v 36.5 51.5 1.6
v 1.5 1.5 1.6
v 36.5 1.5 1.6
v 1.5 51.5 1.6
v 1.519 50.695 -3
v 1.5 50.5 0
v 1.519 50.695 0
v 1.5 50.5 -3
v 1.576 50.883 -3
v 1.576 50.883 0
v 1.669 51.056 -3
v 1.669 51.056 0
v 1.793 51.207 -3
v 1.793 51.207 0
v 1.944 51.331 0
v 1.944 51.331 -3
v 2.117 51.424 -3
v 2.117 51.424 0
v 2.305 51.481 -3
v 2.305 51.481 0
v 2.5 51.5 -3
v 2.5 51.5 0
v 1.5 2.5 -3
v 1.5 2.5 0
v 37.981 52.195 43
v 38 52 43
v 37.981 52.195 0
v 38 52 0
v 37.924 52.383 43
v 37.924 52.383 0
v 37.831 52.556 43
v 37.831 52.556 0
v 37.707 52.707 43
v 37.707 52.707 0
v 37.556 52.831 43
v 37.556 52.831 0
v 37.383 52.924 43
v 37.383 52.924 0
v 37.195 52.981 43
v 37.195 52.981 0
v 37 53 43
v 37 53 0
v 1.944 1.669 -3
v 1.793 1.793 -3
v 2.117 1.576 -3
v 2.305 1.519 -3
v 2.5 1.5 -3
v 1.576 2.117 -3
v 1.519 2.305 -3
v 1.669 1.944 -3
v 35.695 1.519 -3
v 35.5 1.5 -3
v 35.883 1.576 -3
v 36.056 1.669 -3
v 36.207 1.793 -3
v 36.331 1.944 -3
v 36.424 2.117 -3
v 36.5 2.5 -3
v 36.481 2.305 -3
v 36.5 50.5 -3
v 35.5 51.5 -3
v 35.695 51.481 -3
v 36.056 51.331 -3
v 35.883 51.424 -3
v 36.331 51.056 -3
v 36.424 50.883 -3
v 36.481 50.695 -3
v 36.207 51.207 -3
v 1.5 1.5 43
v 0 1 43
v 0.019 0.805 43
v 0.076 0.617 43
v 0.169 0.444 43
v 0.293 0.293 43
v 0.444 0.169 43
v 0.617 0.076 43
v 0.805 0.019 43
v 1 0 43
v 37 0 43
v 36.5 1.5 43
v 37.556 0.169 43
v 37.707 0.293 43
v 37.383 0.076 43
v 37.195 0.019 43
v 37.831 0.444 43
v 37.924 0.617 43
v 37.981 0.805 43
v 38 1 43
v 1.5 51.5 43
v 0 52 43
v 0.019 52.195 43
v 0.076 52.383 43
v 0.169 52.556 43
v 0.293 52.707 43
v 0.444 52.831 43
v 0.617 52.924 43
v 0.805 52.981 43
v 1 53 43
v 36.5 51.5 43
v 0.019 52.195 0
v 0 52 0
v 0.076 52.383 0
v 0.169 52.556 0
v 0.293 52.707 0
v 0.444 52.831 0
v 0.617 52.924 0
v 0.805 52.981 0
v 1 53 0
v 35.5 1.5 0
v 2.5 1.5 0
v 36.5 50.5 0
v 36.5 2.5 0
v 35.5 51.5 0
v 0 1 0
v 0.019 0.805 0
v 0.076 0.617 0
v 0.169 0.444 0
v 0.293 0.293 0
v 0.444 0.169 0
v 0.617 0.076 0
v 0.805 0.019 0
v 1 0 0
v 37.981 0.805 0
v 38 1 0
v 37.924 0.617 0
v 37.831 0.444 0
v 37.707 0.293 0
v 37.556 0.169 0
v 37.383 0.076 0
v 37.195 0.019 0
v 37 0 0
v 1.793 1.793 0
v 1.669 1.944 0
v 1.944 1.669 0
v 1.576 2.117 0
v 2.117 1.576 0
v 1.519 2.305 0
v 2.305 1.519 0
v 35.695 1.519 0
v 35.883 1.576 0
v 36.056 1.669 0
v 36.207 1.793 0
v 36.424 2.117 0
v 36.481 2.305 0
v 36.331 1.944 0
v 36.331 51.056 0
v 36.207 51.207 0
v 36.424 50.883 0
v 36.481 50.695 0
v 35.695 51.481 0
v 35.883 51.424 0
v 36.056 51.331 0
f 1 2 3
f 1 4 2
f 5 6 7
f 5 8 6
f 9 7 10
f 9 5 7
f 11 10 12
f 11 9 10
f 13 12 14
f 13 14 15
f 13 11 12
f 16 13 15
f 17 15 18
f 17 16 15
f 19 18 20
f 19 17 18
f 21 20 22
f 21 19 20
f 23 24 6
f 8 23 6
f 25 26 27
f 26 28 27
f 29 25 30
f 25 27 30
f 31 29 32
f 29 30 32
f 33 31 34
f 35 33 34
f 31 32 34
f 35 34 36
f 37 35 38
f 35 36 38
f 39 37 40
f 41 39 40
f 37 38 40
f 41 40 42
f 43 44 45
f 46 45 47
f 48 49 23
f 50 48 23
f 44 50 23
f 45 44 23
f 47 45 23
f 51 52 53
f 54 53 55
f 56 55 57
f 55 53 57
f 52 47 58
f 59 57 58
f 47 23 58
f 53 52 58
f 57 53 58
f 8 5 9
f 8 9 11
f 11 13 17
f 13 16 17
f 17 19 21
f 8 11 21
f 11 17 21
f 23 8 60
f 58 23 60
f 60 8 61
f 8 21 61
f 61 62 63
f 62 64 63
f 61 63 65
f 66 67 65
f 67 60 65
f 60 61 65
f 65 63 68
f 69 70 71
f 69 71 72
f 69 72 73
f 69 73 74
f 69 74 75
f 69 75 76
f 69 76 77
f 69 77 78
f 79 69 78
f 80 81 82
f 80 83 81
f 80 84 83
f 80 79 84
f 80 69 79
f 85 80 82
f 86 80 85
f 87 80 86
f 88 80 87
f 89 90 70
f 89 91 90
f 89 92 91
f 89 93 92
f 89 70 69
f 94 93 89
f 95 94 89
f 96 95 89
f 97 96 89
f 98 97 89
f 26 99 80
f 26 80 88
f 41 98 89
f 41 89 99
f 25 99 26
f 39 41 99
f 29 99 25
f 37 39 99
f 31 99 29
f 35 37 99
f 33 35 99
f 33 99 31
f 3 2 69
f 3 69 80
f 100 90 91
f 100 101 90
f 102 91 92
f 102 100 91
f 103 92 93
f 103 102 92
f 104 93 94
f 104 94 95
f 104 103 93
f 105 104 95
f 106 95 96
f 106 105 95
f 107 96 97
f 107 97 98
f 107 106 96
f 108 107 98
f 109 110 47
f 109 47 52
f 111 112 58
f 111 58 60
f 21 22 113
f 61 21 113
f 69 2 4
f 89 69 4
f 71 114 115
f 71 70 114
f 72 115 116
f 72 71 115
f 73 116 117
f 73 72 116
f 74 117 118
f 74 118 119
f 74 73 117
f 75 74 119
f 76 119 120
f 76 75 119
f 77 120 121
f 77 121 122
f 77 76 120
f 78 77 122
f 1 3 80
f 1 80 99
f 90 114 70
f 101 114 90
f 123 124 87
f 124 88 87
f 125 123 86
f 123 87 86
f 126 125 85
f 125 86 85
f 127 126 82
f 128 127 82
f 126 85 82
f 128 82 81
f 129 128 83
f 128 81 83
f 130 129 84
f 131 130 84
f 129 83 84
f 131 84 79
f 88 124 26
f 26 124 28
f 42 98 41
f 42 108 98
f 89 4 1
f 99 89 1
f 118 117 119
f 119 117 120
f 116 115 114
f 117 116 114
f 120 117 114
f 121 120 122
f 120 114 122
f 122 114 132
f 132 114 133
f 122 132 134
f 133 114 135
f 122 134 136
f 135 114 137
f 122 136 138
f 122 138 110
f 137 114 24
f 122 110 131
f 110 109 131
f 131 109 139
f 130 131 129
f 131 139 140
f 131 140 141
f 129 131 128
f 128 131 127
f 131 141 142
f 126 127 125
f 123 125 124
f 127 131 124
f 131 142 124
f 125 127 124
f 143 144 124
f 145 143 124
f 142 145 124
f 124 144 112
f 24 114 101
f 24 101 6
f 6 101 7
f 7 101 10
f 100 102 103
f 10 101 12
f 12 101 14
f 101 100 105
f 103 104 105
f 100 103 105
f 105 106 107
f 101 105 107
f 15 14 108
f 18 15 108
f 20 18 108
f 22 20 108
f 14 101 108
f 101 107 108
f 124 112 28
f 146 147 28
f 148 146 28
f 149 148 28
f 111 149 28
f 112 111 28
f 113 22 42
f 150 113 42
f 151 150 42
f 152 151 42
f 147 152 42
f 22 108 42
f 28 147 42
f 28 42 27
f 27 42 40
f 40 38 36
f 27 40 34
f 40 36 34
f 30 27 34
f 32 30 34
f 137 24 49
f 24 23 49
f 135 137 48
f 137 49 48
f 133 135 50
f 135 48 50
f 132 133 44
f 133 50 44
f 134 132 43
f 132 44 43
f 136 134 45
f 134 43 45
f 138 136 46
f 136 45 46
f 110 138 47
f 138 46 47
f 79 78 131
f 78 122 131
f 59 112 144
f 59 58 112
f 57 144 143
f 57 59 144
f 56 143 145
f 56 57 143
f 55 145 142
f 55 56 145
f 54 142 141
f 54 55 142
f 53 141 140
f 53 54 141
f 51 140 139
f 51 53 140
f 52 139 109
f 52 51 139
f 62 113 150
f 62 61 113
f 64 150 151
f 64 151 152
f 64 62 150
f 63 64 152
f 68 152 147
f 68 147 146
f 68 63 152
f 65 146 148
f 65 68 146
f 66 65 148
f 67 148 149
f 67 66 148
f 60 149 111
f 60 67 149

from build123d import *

# Parameters (mm, degrees)
F0_W     = 35
F0_H     = 50
F1_DEPTH = 3
F0_W_2   = 38
F0_H_2   = 53
F2_DEPTH = 1.6
F3_DEPTH = 43
F4_R     = 1


with BuildPart() as f1:
    # F0 (on Top) → F1 (new body)
    with BuildSketch(Plane.XY):
        with Locations((19, 26.5)):
            Rectangle(F0_W, F0_H)
    extrude(amount=-F1_DEPTH)

    # F0 (on Top) → F2 (join)
    with BuildSketch(Plane.XY):
        with Locations((19, 26.5)):
            Rectangle(F0_W_2, F0_H_2)
        with Locations((19, 26.5)):
            Rectangle(F0_W, F0_H, mode=Mode.SUBTRACT)
        with Locations((19, 26.5)):
            Rectangle(F0_W, F0_H)
    extrude(amount=F2_DEPTH)

    # F0 (on Top) → F3 (join)
    with BuildSketch(Plane.XY):
        with Locations((19, 26.5)):
            Rectangle(F0_W_2, F0_H_2)
        with Locations((19, 26.5)):
            Rectangle(F0_W, F0_H, mode=Mode.SUBTRACT)
    extrude(amount=F3_DEPTH)

    # F4
    f4_edges = [f1.edges().sort_by_distance(p)[0] for p in [
        (36.5, 1.5, -1.5),
        (1.5, 1.5, -1.5),
        (1.5, 51.5, -1.5),
        (36.5, 51.5, -1.5),
        (0, 53, 21.5),
        (38, 53, 21.5),
        (0, 0, 21.5),
        (38, 0, 21.5),
    ]]
    fillet(f4_edges, radius=F4_R)


solid = f1.part
